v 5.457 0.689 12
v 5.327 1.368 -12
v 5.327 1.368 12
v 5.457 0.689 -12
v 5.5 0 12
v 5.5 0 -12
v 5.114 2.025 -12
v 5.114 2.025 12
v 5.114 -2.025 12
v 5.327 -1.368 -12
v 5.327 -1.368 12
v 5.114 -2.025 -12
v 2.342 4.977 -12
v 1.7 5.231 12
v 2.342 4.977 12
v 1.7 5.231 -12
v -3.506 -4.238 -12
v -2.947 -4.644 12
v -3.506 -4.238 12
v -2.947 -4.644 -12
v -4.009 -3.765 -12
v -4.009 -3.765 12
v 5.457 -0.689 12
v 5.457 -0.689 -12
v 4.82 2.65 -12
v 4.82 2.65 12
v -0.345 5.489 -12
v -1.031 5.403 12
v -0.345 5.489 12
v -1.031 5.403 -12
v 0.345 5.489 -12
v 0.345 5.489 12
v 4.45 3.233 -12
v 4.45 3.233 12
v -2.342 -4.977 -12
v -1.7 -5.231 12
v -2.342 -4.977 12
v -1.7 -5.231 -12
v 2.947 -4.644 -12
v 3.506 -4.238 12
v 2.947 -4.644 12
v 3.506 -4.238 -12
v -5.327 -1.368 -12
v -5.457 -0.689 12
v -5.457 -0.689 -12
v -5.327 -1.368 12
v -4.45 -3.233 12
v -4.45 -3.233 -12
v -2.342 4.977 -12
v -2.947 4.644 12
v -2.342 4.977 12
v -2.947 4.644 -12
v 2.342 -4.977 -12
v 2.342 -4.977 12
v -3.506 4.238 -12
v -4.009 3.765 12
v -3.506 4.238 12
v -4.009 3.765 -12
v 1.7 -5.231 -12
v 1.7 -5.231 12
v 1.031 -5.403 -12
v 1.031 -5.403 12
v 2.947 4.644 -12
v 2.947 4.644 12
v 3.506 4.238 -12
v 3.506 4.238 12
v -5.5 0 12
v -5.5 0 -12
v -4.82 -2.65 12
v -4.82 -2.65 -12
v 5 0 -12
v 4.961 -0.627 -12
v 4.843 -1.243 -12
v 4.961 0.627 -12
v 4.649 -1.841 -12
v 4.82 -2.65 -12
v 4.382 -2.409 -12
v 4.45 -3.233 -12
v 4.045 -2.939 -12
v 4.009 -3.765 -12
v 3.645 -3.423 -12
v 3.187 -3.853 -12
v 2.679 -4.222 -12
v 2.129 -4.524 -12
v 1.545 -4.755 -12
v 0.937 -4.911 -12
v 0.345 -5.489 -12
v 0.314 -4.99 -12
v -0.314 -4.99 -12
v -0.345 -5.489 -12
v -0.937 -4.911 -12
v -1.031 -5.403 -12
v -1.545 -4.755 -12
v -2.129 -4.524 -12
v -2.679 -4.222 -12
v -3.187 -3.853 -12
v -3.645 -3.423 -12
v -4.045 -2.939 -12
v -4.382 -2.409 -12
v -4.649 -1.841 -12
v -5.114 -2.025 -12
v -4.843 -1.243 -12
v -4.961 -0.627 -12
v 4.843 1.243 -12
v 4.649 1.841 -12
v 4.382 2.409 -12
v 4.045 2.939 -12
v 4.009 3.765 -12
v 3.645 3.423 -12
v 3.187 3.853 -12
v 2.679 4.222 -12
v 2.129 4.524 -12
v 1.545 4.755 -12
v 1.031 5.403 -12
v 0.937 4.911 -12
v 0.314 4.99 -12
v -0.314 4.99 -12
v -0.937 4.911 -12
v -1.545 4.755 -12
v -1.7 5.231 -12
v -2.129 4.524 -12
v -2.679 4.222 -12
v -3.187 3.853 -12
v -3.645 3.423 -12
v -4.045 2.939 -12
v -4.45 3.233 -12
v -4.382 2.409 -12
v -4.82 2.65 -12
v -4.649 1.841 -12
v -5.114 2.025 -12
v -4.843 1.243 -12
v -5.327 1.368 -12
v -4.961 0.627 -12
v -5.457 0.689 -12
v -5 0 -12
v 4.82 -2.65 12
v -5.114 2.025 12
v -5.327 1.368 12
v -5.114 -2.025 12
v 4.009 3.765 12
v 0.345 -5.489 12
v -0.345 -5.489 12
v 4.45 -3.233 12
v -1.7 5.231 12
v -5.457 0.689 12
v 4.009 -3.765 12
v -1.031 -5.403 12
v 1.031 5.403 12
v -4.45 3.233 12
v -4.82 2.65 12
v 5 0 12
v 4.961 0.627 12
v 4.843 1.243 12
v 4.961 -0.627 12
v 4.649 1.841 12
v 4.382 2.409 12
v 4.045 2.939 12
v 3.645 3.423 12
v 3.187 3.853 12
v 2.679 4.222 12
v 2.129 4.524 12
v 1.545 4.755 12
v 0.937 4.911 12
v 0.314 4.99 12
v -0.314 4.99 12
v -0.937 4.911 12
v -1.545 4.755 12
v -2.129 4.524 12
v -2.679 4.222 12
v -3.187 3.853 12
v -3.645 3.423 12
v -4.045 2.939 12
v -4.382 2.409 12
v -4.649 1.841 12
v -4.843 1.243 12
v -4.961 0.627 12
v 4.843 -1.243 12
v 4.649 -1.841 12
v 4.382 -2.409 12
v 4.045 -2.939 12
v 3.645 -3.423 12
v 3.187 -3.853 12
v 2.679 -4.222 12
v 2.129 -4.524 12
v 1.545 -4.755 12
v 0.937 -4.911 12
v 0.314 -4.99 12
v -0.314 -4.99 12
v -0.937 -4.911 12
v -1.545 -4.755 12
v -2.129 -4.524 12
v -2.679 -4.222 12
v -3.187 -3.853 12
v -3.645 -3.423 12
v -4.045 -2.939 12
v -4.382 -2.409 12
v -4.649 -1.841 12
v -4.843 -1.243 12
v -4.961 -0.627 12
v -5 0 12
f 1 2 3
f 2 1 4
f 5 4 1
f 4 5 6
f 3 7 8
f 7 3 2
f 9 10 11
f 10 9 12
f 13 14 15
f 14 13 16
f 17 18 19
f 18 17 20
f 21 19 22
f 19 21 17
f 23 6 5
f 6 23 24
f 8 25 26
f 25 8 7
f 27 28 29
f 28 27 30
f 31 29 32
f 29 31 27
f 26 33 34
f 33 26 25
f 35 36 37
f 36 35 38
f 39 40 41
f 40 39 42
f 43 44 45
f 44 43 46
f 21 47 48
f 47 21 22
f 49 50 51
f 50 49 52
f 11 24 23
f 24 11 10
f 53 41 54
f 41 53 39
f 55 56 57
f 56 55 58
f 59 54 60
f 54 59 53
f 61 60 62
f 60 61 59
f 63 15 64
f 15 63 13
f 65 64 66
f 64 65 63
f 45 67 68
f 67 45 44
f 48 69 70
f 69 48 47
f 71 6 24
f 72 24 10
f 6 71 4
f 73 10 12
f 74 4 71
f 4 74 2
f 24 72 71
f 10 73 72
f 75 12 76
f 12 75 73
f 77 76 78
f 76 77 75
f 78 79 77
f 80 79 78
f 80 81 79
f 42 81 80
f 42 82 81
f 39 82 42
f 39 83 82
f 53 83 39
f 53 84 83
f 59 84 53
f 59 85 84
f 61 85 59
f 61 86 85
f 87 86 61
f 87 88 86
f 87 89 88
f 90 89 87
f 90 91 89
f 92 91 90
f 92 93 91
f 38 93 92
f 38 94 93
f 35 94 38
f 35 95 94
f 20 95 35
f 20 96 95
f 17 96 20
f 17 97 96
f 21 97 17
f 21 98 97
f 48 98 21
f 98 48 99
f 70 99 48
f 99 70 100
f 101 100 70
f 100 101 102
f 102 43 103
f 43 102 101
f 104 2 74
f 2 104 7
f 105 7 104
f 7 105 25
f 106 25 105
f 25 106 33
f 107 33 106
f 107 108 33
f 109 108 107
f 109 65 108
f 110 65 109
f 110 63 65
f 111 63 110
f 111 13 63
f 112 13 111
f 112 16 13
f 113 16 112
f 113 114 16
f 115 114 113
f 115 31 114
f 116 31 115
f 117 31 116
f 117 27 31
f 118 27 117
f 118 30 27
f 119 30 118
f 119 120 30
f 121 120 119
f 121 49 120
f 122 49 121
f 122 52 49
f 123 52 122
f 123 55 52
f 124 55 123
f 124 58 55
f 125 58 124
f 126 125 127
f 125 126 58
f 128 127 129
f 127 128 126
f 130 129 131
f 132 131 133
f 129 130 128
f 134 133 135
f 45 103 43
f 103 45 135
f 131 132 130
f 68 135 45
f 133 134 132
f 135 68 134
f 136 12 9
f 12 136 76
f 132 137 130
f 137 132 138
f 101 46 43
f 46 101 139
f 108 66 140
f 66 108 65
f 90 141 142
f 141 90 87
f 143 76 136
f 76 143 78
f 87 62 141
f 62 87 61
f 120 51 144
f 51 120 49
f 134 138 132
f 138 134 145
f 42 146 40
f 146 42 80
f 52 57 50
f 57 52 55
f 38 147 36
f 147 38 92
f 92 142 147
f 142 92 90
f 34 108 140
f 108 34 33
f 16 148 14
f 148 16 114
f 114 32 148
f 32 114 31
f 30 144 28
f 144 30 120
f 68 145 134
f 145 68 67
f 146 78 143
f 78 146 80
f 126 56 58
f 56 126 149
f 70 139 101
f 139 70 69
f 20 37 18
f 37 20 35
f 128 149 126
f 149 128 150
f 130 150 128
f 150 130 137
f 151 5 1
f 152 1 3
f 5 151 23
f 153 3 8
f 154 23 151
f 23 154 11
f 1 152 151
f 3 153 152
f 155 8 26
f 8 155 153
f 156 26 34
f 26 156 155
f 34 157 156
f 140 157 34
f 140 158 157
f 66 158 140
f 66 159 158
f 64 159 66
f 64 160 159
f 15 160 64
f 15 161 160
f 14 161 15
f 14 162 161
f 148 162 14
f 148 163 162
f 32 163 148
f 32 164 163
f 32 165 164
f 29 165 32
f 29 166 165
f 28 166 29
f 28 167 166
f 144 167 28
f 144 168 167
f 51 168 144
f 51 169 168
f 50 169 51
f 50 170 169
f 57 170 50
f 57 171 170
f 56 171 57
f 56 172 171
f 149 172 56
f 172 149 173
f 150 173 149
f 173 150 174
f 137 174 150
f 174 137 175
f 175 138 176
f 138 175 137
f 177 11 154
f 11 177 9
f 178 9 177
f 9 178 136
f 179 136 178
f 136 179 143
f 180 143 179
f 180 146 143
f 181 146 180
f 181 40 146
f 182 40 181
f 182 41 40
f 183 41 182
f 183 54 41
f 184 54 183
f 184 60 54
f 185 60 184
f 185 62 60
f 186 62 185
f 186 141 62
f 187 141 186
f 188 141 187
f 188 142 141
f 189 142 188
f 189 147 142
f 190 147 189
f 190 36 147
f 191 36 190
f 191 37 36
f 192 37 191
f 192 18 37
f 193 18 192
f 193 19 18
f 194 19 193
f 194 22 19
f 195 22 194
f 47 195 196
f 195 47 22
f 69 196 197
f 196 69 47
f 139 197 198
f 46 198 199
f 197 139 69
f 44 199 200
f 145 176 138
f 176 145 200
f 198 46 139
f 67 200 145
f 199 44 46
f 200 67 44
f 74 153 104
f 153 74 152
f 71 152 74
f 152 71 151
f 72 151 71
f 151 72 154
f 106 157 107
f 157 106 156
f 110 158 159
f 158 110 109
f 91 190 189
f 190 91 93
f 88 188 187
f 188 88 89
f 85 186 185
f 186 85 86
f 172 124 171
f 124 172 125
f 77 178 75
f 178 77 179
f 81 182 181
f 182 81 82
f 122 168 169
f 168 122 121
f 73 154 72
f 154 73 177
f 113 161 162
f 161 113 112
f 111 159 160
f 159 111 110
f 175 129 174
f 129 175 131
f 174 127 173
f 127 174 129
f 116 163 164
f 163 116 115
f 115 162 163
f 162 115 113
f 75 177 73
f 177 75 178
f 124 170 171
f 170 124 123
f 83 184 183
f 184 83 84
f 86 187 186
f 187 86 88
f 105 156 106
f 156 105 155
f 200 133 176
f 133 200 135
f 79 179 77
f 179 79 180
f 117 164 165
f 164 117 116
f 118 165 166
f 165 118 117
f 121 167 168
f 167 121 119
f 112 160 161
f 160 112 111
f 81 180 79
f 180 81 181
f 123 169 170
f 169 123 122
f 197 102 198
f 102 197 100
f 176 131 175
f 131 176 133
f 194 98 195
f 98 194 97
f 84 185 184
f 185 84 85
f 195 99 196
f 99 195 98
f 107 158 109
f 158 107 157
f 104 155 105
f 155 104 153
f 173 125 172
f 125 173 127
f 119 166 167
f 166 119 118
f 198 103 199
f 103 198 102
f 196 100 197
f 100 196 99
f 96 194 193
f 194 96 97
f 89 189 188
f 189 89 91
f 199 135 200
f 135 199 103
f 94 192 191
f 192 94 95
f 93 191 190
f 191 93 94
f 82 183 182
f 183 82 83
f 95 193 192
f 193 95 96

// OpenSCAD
$fn = 50;


difference() {
	union() {
		translate(v = [0, 0, -12.0000000000]) {
			cylinder(h = 24, r = 5.5000000000);
		}
	}
	union() {
		translate(v = [0, 0, -100.0000000000]) {
			cylinder(h = 200, r = 5.0000000000);
		}
	}
}
